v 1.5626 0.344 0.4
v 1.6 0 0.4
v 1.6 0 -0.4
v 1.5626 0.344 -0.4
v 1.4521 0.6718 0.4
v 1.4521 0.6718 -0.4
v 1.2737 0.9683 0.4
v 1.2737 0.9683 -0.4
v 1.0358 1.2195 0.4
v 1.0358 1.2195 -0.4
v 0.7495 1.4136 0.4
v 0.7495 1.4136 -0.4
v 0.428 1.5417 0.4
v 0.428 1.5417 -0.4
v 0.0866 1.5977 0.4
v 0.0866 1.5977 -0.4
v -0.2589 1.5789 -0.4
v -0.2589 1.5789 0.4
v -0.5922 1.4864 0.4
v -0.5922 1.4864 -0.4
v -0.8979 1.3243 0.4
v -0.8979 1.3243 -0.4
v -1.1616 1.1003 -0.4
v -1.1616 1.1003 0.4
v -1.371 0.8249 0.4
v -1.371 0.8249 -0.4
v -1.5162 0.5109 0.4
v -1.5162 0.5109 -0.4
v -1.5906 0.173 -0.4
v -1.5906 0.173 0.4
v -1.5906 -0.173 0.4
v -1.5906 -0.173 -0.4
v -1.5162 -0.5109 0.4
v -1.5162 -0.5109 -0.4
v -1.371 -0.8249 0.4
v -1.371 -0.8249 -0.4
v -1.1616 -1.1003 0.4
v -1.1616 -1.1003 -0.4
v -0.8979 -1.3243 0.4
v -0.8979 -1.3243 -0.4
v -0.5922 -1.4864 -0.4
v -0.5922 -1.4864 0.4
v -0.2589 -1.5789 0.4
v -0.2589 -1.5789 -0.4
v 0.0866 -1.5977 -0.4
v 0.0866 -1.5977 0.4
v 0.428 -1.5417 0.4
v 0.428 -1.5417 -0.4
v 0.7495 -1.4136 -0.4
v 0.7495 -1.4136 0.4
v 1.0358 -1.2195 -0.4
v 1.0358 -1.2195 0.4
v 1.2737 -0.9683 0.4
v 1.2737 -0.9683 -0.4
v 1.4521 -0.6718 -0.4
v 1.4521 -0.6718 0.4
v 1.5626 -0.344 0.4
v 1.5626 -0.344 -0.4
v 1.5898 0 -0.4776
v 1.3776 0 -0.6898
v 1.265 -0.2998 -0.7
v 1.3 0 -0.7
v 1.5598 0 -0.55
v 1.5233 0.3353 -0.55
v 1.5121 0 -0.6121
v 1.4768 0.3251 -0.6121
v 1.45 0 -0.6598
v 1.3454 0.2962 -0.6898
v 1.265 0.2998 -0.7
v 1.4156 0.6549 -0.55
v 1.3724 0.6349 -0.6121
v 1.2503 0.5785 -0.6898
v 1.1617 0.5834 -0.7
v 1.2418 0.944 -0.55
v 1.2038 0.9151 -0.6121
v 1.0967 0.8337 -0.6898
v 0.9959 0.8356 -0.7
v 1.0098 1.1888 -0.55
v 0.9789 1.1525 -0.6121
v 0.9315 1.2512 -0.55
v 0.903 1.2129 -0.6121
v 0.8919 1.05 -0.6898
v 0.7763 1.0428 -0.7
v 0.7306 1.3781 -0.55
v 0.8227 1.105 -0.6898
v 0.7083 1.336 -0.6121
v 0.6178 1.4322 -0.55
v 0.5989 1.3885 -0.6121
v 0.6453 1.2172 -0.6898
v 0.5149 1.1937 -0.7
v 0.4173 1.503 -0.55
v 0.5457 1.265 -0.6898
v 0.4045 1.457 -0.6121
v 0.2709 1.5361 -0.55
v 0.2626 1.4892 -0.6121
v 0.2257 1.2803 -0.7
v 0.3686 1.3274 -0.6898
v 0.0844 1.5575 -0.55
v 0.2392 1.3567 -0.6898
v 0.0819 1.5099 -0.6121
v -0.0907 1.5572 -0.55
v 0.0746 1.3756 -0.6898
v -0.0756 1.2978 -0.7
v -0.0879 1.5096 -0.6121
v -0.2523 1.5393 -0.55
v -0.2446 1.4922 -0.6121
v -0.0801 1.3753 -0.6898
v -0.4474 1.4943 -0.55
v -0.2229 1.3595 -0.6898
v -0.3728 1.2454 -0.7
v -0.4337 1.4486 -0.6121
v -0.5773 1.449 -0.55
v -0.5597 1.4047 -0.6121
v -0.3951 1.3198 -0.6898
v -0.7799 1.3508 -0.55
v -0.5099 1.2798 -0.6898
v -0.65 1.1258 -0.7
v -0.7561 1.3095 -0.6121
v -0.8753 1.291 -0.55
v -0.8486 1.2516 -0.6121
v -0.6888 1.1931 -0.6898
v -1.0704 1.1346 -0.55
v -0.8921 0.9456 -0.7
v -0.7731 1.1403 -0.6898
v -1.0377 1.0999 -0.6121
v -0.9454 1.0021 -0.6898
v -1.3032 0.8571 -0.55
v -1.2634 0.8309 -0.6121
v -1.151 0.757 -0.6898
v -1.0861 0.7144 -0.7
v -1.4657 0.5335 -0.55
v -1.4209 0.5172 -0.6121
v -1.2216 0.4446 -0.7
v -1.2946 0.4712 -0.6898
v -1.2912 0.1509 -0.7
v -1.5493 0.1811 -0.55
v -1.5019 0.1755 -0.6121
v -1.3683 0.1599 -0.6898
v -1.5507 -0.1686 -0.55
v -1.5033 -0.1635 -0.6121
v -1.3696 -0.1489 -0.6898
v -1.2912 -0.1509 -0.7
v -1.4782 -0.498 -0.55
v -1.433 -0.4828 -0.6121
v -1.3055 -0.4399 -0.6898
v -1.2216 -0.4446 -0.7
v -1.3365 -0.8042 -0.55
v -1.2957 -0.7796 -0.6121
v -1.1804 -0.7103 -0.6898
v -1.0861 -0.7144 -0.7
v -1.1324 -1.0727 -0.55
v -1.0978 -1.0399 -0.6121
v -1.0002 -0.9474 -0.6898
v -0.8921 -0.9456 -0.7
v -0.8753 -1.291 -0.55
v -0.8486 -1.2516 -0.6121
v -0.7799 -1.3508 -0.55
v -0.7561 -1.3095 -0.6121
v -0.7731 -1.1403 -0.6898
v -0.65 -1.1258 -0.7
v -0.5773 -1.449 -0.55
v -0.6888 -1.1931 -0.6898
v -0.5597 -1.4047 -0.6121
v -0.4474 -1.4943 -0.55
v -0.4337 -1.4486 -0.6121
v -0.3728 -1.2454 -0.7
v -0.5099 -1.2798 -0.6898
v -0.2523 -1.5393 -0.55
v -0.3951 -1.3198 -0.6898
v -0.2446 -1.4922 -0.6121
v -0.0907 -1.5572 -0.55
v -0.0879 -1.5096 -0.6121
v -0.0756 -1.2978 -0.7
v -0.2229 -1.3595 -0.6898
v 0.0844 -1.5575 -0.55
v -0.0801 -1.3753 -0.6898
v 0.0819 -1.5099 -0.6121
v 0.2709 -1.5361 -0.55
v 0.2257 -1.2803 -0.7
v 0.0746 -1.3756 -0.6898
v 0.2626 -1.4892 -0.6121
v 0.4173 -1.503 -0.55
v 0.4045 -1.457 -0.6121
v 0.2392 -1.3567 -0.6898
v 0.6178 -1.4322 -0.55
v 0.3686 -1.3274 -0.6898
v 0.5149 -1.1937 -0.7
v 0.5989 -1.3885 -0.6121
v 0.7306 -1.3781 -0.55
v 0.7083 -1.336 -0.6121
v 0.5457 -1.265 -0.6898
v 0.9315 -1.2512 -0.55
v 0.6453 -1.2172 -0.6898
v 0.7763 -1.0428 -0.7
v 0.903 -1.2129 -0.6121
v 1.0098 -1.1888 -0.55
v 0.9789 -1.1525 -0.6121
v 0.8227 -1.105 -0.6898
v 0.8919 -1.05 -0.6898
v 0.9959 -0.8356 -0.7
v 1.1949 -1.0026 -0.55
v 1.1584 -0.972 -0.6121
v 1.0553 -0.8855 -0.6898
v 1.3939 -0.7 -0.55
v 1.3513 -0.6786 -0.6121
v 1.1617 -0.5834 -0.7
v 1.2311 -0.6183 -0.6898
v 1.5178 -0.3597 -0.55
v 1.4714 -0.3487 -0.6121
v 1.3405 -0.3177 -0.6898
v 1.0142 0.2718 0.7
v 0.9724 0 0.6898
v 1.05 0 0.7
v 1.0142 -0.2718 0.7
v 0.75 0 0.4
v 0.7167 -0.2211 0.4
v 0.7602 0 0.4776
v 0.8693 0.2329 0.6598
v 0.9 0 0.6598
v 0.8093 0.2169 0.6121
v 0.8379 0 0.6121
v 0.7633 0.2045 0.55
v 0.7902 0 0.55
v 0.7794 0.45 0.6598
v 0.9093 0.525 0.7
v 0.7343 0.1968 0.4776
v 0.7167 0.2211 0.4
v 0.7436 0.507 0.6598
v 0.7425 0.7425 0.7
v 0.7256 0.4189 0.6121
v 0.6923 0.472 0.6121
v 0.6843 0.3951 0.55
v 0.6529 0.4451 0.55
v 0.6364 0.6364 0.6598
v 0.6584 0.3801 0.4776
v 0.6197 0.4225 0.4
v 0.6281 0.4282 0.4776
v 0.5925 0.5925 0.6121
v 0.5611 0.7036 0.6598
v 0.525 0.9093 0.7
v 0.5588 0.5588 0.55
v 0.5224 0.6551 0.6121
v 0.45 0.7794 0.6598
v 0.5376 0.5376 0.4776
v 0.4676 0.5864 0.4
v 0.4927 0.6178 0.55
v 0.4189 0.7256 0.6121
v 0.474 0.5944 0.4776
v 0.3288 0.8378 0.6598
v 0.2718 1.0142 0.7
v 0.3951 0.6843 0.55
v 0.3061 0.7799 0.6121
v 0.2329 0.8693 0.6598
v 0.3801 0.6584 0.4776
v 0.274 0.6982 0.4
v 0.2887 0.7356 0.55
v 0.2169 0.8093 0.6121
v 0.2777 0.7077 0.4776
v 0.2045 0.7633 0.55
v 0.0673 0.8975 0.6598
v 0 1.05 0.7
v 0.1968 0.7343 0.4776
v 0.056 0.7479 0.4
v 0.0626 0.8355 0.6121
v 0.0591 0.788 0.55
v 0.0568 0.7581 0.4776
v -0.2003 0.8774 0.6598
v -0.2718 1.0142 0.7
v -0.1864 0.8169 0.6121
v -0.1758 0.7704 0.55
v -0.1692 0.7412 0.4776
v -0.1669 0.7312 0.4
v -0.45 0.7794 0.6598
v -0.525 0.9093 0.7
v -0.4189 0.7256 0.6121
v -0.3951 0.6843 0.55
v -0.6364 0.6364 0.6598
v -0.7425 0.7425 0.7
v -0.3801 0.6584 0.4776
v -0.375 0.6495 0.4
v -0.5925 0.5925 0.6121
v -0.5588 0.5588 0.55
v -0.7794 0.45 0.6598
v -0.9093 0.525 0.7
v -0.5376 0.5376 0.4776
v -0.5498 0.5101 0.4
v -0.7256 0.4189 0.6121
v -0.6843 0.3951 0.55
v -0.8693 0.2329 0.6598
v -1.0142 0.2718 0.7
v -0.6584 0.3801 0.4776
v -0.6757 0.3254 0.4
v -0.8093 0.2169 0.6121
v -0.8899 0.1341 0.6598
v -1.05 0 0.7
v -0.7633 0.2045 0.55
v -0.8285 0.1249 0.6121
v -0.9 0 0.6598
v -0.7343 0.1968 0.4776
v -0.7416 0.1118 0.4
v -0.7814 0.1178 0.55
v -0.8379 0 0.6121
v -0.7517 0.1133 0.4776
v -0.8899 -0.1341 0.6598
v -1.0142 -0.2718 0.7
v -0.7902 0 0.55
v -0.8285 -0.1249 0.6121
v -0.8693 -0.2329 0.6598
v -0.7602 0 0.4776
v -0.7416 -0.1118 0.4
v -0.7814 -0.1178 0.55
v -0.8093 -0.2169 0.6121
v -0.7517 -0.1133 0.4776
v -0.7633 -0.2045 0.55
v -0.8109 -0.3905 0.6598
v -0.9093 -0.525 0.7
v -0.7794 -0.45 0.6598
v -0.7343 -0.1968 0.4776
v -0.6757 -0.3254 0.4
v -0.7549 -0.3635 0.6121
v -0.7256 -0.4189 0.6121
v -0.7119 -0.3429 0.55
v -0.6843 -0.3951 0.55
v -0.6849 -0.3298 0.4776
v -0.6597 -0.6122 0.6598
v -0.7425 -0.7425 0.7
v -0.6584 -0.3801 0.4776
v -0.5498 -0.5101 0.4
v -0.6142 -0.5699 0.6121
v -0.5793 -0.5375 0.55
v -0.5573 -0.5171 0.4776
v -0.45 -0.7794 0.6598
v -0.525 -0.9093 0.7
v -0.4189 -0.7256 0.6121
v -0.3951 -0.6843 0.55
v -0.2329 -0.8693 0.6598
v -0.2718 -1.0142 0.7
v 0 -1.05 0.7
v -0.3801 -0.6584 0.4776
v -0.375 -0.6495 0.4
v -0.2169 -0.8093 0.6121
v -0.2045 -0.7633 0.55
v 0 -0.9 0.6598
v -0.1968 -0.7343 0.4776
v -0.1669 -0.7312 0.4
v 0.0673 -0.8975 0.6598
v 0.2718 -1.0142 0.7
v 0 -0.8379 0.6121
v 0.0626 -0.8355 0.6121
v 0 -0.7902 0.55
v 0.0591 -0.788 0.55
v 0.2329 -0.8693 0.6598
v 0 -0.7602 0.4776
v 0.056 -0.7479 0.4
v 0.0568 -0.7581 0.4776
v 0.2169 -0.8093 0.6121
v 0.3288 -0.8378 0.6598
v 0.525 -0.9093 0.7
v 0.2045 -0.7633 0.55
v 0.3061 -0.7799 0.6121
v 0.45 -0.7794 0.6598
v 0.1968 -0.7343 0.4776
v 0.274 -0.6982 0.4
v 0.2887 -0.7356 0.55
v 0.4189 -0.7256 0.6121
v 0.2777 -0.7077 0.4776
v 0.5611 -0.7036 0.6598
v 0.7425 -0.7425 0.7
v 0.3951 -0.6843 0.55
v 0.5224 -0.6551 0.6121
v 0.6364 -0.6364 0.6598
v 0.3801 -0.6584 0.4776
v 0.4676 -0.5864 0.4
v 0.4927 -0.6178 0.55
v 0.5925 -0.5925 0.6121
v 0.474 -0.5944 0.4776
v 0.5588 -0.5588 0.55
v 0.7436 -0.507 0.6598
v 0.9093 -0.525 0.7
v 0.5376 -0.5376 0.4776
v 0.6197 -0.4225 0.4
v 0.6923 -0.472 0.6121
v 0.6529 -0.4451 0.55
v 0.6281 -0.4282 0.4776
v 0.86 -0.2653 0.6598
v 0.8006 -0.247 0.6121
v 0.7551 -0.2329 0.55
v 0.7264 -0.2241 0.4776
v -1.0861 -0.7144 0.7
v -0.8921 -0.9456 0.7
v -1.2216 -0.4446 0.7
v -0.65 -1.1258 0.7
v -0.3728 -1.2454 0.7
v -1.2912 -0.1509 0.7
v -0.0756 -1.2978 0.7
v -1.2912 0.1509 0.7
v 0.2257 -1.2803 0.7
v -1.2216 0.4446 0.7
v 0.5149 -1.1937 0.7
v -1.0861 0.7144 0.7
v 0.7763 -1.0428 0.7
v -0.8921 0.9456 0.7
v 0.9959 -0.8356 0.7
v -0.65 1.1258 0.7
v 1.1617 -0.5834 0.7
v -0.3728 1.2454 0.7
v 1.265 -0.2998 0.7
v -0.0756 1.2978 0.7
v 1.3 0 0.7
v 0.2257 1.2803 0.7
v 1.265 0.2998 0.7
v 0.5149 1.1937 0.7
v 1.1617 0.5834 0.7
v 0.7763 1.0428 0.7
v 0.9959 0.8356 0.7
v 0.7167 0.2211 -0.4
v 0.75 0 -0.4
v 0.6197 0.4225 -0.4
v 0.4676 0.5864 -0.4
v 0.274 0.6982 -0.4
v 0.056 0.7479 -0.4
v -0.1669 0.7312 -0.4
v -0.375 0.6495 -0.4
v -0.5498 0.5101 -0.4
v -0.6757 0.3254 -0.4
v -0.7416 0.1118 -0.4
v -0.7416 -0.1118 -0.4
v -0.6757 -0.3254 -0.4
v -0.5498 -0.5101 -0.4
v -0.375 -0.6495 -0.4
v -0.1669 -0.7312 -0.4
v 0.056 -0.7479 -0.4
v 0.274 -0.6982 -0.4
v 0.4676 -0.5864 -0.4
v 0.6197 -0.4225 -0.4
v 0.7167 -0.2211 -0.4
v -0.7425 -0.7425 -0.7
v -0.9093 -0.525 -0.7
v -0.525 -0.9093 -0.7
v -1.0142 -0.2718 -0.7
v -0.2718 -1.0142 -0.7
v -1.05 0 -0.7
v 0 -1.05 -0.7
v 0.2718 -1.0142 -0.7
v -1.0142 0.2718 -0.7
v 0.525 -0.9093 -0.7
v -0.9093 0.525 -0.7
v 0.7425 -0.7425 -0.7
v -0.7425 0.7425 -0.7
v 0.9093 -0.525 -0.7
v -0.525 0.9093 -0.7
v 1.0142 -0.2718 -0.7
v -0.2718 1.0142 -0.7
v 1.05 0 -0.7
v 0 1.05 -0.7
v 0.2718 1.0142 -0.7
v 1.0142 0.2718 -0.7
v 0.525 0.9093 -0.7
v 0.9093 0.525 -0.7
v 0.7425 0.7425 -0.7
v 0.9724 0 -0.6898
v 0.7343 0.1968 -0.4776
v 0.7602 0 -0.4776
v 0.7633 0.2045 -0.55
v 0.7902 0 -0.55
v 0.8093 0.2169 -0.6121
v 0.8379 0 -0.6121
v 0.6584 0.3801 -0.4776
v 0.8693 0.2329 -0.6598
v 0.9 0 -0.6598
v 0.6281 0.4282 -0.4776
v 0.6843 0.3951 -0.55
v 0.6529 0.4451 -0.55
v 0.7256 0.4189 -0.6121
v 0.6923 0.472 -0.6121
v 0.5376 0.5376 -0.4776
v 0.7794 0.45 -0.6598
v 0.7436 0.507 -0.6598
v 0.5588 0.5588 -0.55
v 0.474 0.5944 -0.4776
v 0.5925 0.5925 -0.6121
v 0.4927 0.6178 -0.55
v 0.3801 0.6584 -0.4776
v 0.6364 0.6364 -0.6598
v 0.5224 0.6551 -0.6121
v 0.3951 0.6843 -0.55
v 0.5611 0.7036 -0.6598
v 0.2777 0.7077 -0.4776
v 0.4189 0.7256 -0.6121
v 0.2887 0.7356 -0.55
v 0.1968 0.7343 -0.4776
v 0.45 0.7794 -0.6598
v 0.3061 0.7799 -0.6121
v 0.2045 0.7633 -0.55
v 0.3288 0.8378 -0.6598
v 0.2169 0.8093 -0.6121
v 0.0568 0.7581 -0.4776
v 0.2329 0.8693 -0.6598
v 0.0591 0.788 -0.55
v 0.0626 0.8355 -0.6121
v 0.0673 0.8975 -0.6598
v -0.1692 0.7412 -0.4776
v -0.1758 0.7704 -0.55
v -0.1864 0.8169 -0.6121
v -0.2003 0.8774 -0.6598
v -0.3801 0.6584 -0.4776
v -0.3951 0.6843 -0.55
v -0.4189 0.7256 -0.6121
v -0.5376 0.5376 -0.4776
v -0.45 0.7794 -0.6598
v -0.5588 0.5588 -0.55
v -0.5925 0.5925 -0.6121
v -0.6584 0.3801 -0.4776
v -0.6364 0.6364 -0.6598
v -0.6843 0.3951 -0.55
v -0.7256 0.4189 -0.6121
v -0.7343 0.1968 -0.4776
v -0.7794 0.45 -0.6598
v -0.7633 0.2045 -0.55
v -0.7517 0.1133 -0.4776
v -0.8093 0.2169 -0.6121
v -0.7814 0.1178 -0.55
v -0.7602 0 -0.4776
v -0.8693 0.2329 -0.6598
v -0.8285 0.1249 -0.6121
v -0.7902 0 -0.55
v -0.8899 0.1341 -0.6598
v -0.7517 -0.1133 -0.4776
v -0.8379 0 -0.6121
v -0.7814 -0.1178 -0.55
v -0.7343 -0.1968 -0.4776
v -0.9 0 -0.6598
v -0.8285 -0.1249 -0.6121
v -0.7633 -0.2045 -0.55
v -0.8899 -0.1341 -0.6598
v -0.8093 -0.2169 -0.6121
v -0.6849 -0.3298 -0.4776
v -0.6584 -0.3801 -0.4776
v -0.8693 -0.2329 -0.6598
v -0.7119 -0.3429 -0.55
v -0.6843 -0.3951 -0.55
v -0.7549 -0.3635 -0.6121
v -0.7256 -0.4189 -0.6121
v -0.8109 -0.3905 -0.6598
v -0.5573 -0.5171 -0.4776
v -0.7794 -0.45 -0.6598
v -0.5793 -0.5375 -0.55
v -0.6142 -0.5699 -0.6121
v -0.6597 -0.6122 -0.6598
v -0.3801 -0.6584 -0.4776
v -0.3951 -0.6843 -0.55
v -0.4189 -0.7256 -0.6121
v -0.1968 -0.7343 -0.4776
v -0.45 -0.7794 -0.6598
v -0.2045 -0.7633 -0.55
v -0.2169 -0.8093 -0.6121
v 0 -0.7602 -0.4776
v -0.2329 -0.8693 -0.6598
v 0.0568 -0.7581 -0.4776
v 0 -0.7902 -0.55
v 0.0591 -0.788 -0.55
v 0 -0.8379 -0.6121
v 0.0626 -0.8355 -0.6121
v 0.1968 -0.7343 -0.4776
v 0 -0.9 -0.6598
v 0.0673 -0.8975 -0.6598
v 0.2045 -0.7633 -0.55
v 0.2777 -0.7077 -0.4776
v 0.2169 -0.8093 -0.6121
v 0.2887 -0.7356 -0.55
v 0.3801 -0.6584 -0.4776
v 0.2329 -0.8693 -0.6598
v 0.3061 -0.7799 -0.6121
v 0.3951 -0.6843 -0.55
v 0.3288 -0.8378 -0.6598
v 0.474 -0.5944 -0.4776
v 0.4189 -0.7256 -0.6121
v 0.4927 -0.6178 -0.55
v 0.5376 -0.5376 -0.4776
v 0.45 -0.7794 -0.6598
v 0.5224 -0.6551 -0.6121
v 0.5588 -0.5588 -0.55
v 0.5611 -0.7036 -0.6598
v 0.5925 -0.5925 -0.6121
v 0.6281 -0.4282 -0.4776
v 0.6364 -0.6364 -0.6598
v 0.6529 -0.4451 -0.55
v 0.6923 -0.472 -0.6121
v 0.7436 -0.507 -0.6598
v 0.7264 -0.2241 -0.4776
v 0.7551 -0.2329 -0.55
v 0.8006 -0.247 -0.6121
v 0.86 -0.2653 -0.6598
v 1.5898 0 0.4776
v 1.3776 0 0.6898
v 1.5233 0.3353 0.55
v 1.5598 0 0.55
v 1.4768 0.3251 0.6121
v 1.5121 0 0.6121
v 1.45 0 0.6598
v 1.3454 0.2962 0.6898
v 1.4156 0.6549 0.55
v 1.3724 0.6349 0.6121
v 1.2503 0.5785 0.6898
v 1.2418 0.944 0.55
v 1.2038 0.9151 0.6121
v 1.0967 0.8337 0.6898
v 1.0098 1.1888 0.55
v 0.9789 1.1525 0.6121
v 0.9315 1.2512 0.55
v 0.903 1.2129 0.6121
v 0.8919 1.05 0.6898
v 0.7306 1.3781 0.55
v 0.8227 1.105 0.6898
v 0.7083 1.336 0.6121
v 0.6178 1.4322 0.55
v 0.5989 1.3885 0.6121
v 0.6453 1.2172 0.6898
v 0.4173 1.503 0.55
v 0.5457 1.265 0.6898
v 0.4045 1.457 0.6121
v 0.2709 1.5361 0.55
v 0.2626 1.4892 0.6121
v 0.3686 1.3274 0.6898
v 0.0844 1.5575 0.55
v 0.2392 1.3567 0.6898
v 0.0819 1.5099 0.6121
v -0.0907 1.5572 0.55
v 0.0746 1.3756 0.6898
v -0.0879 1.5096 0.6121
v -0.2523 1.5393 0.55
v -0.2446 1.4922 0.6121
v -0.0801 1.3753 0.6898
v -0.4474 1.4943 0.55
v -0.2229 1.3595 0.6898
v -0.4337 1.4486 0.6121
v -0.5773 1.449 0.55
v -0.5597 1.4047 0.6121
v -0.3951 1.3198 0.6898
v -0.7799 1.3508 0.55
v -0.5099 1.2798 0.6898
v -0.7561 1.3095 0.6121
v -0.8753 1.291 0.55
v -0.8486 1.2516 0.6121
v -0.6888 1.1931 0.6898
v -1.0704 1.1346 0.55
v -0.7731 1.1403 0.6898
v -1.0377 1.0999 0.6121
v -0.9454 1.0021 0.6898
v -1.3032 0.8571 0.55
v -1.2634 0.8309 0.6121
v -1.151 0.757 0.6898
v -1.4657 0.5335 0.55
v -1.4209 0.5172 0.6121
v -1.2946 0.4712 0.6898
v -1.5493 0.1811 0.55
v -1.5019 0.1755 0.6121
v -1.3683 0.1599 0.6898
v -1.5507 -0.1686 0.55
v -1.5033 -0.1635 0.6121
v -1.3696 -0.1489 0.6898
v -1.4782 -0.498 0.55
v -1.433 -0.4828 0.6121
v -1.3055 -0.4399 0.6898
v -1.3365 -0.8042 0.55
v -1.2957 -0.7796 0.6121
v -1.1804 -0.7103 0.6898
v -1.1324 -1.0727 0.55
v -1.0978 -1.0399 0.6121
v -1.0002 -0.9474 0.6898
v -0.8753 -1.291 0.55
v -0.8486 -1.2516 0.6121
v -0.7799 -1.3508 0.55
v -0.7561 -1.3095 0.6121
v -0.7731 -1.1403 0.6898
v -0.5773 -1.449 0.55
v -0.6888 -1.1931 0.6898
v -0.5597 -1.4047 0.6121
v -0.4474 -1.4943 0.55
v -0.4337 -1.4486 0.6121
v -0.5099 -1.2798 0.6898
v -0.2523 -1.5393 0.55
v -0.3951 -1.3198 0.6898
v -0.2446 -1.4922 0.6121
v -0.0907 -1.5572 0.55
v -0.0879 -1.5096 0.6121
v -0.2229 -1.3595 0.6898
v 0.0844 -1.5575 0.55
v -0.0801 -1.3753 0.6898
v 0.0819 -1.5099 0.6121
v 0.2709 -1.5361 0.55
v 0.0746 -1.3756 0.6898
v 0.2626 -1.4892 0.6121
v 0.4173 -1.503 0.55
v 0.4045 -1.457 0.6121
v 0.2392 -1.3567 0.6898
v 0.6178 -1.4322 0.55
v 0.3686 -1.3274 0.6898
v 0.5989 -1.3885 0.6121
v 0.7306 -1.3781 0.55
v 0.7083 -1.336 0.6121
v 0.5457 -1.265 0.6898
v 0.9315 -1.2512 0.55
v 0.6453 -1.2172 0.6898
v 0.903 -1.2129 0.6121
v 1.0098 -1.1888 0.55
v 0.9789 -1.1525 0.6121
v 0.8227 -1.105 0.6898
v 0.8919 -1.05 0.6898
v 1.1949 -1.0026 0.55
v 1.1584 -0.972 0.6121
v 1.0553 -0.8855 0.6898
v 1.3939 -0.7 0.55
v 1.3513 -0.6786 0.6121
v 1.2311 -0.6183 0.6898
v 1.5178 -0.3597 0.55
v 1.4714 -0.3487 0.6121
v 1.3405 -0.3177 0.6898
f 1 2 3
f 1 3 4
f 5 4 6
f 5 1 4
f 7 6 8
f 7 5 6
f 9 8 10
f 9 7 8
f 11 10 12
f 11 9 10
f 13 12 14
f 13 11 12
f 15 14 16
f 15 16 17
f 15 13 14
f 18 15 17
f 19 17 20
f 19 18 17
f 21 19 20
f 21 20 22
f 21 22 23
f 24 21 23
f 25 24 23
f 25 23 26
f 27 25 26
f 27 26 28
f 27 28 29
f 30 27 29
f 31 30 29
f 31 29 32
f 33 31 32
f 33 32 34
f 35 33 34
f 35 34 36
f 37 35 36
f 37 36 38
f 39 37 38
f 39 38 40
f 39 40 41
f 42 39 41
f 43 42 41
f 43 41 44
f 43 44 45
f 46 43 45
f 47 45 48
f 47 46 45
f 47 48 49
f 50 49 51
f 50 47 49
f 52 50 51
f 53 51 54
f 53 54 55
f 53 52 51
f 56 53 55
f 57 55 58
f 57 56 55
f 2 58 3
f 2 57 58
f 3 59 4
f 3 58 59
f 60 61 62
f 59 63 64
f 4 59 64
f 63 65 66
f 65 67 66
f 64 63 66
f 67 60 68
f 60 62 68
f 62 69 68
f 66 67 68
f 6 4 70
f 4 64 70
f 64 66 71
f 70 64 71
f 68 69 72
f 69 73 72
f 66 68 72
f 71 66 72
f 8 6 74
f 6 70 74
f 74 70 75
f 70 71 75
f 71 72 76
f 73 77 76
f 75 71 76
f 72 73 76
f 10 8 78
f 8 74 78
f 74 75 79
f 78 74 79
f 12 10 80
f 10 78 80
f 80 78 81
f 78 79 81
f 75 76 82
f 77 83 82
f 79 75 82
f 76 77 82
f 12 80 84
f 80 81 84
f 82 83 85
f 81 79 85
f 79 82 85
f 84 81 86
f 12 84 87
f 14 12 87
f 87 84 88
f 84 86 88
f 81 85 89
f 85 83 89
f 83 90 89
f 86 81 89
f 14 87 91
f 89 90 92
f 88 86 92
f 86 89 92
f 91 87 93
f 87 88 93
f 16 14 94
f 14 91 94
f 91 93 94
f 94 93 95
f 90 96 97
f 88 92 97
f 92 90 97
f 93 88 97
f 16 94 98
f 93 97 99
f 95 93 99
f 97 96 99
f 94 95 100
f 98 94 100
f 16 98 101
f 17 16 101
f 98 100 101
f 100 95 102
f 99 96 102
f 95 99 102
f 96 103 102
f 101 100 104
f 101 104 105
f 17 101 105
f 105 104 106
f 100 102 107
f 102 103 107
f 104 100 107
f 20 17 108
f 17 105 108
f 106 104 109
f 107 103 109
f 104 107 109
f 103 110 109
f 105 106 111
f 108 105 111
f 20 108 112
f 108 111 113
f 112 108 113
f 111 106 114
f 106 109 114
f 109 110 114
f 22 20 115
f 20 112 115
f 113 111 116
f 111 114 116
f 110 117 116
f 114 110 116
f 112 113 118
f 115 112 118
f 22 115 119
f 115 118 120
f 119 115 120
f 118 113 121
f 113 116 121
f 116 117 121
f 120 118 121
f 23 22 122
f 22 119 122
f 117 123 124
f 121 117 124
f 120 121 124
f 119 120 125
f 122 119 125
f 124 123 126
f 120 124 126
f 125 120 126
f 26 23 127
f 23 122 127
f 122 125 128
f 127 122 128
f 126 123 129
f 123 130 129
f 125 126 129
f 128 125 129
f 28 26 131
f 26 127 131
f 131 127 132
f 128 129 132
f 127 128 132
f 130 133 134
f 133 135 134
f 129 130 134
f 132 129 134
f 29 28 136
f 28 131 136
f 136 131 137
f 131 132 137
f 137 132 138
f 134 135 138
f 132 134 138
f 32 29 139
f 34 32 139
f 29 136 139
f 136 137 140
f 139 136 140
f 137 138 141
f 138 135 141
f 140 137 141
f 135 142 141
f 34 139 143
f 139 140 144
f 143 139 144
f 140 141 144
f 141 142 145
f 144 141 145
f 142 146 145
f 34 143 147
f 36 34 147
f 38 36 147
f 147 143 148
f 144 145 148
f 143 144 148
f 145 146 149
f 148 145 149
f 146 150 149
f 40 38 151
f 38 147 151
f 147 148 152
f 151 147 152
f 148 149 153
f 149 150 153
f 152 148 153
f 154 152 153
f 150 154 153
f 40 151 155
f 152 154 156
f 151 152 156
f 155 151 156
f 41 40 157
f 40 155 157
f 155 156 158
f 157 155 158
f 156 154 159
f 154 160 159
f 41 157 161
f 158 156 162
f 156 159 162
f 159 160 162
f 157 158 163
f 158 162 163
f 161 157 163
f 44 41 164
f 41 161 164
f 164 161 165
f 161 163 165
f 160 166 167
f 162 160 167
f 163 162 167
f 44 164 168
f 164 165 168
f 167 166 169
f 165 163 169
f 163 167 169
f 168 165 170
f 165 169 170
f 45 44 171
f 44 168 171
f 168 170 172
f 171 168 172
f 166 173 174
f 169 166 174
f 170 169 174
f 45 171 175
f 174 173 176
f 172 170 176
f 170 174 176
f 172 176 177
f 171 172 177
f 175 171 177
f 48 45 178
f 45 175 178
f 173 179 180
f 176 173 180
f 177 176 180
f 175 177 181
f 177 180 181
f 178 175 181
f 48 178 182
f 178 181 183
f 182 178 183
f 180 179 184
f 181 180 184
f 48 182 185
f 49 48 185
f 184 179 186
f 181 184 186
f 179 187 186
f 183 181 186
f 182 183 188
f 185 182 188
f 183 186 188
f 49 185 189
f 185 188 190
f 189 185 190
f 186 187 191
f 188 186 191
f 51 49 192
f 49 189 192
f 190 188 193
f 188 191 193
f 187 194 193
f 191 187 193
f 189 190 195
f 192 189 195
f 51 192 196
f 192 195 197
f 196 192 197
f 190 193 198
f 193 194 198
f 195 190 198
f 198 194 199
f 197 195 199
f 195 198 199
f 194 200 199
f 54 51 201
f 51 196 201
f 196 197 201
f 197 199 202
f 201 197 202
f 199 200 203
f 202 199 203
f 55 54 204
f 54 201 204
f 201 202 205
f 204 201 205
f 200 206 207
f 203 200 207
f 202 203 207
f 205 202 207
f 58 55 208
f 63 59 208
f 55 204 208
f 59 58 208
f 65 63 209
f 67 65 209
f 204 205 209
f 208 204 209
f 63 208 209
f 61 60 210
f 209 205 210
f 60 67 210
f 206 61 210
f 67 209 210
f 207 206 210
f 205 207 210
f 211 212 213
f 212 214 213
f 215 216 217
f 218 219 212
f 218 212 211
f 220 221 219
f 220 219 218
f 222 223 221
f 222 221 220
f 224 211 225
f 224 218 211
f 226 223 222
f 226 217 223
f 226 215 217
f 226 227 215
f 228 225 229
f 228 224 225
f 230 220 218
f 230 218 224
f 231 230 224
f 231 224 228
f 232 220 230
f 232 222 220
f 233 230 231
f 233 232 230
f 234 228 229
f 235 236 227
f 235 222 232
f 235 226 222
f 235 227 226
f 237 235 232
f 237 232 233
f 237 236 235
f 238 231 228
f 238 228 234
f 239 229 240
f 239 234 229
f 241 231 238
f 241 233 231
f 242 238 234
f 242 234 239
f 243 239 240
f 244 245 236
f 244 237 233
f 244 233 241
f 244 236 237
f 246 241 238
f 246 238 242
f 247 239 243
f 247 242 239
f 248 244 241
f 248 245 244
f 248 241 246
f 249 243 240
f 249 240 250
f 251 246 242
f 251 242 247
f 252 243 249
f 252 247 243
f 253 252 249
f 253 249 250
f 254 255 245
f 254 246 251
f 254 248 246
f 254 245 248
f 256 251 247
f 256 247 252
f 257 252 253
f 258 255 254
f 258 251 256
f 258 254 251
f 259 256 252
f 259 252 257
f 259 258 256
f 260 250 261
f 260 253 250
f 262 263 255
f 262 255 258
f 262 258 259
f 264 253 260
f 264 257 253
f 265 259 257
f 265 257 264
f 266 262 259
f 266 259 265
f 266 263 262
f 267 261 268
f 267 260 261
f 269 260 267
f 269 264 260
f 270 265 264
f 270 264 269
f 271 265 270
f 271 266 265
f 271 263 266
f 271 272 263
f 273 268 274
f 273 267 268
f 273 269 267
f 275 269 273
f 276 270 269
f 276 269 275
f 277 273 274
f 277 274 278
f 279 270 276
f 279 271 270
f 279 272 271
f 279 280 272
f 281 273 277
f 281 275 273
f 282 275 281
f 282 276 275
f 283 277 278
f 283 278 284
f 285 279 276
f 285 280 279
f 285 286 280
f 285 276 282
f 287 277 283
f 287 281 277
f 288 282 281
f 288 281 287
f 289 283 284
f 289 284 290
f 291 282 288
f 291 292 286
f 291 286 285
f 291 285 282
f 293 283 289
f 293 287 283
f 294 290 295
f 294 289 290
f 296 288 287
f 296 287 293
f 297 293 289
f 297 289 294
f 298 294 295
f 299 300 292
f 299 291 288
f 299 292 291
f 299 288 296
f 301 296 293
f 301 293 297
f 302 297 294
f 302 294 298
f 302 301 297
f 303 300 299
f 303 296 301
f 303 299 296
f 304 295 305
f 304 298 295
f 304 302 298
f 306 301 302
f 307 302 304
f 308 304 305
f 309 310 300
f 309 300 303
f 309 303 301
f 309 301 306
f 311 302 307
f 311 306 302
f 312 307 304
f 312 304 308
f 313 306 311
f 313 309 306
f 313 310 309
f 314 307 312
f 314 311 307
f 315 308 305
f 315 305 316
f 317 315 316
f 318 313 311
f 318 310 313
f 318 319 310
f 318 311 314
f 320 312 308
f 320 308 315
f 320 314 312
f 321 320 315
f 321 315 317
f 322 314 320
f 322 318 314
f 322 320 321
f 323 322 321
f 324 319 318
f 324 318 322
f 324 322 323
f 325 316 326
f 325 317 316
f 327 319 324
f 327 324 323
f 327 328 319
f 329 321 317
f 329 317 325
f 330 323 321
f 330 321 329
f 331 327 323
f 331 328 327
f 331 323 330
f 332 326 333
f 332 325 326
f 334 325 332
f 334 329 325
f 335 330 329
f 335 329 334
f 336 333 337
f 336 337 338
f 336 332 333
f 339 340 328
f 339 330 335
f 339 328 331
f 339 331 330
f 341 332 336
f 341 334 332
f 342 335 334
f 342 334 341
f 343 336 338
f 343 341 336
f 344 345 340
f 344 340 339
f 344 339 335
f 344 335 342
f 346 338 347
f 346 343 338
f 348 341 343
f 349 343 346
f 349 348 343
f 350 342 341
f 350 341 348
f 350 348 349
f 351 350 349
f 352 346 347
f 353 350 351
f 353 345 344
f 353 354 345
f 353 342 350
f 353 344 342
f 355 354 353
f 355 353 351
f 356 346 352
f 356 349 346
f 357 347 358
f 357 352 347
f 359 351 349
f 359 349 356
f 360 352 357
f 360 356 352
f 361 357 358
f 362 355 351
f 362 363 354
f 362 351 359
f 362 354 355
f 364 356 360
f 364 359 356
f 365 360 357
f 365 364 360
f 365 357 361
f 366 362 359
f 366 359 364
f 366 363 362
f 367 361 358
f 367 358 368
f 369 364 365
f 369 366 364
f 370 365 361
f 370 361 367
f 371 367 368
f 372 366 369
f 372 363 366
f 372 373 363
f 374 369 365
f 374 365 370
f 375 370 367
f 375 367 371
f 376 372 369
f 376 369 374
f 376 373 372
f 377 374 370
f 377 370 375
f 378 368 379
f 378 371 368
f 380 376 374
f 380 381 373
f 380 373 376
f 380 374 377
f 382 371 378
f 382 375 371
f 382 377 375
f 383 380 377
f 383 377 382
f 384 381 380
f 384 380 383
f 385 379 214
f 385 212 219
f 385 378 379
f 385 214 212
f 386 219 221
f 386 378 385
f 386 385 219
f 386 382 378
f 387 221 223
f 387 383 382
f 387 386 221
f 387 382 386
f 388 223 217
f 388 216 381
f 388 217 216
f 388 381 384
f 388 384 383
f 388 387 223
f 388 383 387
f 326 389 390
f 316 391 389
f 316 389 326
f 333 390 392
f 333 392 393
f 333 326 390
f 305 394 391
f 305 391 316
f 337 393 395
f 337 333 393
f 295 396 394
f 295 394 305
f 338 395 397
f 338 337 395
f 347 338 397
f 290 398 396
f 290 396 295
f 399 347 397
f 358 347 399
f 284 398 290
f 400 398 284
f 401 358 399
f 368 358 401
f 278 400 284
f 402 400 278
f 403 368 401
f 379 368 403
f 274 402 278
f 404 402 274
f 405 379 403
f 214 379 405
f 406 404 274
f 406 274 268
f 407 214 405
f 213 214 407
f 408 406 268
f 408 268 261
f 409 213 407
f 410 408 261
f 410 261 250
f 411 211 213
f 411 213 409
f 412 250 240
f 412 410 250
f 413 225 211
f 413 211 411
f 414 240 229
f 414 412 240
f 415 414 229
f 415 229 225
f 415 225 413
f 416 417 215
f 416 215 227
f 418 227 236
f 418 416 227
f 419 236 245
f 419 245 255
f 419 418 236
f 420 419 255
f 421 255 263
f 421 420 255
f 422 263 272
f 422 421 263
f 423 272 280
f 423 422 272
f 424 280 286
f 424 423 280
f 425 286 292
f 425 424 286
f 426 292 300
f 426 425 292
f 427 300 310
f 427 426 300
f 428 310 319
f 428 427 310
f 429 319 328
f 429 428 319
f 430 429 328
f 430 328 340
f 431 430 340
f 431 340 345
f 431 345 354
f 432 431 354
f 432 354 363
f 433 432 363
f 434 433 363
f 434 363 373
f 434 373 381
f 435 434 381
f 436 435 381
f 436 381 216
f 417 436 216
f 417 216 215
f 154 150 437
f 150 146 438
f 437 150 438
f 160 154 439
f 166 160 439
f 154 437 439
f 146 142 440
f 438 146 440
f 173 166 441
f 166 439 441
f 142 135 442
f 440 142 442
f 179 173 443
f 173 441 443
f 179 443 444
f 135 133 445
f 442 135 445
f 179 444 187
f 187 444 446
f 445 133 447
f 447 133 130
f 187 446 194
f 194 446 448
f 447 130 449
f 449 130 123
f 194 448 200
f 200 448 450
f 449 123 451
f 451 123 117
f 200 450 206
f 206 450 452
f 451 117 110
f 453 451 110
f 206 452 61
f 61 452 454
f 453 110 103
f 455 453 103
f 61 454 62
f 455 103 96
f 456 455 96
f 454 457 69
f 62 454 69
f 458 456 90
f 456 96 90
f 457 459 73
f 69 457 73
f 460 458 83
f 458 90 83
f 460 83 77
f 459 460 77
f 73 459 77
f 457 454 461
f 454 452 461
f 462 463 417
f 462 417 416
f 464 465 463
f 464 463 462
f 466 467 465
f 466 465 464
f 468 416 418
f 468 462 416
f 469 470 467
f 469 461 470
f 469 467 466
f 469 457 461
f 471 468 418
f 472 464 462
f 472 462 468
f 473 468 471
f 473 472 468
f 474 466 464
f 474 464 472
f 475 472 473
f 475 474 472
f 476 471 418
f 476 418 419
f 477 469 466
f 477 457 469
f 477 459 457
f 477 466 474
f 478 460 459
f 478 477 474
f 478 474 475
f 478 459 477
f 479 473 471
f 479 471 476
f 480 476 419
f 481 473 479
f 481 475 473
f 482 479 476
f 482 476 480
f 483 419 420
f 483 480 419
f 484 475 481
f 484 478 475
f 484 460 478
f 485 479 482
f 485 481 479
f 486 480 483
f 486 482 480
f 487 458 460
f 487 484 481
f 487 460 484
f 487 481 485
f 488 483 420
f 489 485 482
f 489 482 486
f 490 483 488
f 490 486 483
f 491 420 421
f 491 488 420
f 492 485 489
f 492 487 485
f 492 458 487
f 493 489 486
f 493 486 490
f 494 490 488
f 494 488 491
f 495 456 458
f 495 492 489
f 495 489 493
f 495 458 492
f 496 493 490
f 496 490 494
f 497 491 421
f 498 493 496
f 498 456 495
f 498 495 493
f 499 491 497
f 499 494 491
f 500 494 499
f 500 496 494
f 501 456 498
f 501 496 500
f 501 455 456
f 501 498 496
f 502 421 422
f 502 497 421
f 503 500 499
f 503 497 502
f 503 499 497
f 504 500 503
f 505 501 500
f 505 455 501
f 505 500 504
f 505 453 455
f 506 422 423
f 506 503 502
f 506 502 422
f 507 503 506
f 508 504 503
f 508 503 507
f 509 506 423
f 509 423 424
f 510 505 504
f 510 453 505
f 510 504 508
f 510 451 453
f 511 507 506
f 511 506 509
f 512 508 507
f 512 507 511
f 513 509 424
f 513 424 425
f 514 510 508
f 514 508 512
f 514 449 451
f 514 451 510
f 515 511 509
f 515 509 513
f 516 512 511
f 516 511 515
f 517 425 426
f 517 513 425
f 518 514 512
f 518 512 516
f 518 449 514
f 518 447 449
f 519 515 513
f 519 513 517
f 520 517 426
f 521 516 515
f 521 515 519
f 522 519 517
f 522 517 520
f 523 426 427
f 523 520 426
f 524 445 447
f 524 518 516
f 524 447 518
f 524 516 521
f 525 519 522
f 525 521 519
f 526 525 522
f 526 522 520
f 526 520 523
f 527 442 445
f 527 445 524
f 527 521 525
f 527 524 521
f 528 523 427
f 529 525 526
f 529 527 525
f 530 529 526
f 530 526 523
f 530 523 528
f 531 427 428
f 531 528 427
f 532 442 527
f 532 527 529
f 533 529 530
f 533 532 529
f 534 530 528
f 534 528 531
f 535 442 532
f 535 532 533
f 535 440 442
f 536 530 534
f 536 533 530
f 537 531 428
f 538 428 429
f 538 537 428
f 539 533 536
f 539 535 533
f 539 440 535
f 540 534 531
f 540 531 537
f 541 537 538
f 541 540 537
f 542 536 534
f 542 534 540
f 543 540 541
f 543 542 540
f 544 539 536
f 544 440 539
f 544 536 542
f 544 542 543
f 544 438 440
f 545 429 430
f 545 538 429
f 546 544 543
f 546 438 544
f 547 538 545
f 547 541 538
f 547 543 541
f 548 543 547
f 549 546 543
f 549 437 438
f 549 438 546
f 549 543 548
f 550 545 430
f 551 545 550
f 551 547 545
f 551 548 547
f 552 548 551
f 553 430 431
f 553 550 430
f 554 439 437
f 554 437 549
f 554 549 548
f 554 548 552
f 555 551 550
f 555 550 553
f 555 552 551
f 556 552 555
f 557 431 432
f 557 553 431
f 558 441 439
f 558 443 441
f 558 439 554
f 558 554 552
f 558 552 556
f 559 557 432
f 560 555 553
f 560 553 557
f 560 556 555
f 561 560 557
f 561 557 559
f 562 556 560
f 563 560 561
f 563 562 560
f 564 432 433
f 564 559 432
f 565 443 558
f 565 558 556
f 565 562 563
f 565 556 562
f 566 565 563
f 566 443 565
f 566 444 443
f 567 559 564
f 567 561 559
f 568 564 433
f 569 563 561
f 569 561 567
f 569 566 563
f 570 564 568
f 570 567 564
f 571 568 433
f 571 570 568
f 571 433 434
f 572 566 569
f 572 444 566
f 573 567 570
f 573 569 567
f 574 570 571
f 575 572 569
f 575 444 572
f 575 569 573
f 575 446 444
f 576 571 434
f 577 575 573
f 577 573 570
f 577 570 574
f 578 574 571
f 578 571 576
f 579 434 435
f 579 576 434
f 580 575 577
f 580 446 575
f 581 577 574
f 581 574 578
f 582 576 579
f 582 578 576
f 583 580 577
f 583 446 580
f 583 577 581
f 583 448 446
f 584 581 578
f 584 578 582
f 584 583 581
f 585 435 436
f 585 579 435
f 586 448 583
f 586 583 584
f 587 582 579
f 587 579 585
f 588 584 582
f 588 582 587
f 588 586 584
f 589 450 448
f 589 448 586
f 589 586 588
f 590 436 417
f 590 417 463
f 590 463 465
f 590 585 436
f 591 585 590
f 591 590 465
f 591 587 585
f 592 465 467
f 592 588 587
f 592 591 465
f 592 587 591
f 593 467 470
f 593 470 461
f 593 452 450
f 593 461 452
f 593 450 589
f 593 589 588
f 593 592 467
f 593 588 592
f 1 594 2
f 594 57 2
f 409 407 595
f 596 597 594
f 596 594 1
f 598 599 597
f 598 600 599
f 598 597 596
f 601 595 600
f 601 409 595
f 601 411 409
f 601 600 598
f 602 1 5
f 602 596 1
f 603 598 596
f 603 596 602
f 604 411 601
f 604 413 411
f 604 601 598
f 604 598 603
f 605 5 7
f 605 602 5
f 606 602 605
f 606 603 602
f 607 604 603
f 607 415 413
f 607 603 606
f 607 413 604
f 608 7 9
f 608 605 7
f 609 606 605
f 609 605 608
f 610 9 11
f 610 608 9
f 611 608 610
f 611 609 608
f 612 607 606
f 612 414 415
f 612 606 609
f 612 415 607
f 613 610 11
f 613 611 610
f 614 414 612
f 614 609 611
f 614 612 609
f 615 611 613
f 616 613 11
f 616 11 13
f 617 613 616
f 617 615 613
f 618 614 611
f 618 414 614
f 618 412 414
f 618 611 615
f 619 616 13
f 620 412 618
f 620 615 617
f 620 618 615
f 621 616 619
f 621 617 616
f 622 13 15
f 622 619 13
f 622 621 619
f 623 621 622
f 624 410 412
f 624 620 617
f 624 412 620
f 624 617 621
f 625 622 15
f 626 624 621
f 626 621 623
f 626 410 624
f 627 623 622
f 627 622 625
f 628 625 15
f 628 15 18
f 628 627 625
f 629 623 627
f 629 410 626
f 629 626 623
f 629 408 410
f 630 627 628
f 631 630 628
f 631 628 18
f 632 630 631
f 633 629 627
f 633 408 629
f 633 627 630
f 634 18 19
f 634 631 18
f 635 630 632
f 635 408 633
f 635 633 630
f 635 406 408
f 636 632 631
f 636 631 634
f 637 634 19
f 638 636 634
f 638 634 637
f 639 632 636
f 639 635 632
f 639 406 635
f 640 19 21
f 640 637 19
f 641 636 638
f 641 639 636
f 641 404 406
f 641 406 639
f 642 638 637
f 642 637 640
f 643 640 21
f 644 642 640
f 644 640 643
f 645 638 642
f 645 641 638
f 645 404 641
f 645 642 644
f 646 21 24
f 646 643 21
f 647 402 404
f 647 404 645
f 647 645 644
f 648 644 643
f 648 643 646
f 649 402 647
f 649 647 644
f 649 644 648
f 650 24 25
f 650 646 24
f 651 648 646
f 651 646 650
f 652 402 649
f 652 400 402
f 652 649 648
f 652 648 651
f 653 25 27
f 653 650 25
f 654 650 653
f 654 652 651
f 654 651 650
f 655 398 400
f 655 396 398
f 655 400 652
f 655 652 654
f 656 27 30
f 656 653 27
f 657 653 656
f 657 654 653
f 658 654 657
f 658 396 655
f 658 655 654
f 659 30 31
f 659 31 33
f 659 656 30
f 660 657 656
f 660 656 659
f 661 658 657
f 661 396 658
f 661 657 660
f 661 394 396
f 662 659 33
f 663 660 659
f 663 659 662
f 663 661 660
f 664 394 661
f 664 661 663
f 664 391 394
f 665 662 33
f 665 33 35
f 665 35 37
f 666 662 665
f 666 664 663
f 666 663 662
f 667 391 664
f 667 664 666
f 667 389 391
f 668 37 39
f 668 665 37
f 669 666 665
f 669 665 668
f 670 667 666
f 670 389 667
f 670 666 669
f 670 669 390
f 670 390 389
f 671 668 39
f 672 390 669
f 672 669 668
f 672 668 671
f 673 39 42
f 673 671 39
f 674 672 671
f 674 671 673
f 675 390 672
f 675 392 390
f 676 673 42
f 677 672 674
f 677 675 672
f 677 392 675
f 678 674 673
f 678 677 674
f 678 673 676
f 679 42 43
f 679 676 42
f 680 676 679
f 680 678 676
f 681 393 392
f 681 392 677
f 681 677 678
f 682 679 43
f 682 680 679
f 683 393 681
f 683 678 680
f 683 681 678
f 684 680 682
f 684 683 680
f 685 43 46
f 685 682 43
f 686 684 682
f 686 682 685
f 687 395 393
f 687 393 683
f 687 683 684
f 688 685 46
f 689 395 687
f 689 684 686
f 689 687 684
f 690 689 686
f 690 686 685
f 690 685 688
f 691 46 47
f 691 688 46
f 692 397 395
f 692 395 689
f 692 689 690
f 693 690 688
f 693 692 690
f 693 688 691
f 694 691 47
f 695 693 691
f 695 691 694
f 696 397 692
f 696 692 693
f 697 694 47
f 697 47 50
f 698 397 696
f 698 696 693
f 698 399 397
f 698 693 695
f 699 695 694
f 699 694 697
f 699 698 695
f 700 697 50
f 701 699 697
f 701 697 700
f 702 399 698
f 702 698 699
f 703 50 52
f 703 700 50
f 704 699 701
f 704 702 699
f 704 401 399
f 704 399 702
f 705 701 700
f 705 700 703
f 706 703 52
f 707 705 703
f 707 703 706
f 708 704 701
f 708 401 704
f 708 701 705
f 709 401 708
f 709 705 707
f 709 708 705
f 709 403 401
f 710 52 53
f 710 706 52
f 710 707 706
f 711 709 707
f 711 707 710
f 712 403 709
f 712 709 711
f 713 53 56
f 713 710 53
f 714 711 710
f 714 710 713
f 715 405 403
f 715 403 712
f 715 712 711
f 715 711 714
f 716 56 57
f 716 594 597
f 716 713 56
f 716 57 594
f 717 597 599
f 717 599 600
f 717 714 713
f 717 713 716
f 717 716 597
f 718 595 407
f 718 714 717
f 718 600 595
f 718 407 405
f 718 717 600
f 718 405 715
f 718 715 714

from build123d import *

# Parameters (mm, degrees)
SKETCH1_R           = 1.6
SKETCH1_R_2         = 0.75
BOSS_EXTRUDE1_DEPTH = 0.7
FILLET2_R           = 0.3


with BuildPart() as part:
    # Sketch1 → Boss-Extrude1 (new body, symmetric)
    with BuildSketch(Plane.XY):
        Circle(SKETCH1_R)
        Circle(SKETCH1_R_2, mode=Mode.SUBTRACT)
    extrude(amount=BOSS_EXTRUDE1_DEPTH, both=True)

    # Fillet2
    fillet2_edges = [part.edges().sort_by_distance(p)[0] for p in [
        (-1.6, 0, -0.7),
        (-1.6, 0, 0.7),
        (-0.75, 0, -0.7),
        (-0.75, 0, 0.7),
    ]]
    fillet(fillet2_edges, radius=FILLET2_R)


solid = part.part
